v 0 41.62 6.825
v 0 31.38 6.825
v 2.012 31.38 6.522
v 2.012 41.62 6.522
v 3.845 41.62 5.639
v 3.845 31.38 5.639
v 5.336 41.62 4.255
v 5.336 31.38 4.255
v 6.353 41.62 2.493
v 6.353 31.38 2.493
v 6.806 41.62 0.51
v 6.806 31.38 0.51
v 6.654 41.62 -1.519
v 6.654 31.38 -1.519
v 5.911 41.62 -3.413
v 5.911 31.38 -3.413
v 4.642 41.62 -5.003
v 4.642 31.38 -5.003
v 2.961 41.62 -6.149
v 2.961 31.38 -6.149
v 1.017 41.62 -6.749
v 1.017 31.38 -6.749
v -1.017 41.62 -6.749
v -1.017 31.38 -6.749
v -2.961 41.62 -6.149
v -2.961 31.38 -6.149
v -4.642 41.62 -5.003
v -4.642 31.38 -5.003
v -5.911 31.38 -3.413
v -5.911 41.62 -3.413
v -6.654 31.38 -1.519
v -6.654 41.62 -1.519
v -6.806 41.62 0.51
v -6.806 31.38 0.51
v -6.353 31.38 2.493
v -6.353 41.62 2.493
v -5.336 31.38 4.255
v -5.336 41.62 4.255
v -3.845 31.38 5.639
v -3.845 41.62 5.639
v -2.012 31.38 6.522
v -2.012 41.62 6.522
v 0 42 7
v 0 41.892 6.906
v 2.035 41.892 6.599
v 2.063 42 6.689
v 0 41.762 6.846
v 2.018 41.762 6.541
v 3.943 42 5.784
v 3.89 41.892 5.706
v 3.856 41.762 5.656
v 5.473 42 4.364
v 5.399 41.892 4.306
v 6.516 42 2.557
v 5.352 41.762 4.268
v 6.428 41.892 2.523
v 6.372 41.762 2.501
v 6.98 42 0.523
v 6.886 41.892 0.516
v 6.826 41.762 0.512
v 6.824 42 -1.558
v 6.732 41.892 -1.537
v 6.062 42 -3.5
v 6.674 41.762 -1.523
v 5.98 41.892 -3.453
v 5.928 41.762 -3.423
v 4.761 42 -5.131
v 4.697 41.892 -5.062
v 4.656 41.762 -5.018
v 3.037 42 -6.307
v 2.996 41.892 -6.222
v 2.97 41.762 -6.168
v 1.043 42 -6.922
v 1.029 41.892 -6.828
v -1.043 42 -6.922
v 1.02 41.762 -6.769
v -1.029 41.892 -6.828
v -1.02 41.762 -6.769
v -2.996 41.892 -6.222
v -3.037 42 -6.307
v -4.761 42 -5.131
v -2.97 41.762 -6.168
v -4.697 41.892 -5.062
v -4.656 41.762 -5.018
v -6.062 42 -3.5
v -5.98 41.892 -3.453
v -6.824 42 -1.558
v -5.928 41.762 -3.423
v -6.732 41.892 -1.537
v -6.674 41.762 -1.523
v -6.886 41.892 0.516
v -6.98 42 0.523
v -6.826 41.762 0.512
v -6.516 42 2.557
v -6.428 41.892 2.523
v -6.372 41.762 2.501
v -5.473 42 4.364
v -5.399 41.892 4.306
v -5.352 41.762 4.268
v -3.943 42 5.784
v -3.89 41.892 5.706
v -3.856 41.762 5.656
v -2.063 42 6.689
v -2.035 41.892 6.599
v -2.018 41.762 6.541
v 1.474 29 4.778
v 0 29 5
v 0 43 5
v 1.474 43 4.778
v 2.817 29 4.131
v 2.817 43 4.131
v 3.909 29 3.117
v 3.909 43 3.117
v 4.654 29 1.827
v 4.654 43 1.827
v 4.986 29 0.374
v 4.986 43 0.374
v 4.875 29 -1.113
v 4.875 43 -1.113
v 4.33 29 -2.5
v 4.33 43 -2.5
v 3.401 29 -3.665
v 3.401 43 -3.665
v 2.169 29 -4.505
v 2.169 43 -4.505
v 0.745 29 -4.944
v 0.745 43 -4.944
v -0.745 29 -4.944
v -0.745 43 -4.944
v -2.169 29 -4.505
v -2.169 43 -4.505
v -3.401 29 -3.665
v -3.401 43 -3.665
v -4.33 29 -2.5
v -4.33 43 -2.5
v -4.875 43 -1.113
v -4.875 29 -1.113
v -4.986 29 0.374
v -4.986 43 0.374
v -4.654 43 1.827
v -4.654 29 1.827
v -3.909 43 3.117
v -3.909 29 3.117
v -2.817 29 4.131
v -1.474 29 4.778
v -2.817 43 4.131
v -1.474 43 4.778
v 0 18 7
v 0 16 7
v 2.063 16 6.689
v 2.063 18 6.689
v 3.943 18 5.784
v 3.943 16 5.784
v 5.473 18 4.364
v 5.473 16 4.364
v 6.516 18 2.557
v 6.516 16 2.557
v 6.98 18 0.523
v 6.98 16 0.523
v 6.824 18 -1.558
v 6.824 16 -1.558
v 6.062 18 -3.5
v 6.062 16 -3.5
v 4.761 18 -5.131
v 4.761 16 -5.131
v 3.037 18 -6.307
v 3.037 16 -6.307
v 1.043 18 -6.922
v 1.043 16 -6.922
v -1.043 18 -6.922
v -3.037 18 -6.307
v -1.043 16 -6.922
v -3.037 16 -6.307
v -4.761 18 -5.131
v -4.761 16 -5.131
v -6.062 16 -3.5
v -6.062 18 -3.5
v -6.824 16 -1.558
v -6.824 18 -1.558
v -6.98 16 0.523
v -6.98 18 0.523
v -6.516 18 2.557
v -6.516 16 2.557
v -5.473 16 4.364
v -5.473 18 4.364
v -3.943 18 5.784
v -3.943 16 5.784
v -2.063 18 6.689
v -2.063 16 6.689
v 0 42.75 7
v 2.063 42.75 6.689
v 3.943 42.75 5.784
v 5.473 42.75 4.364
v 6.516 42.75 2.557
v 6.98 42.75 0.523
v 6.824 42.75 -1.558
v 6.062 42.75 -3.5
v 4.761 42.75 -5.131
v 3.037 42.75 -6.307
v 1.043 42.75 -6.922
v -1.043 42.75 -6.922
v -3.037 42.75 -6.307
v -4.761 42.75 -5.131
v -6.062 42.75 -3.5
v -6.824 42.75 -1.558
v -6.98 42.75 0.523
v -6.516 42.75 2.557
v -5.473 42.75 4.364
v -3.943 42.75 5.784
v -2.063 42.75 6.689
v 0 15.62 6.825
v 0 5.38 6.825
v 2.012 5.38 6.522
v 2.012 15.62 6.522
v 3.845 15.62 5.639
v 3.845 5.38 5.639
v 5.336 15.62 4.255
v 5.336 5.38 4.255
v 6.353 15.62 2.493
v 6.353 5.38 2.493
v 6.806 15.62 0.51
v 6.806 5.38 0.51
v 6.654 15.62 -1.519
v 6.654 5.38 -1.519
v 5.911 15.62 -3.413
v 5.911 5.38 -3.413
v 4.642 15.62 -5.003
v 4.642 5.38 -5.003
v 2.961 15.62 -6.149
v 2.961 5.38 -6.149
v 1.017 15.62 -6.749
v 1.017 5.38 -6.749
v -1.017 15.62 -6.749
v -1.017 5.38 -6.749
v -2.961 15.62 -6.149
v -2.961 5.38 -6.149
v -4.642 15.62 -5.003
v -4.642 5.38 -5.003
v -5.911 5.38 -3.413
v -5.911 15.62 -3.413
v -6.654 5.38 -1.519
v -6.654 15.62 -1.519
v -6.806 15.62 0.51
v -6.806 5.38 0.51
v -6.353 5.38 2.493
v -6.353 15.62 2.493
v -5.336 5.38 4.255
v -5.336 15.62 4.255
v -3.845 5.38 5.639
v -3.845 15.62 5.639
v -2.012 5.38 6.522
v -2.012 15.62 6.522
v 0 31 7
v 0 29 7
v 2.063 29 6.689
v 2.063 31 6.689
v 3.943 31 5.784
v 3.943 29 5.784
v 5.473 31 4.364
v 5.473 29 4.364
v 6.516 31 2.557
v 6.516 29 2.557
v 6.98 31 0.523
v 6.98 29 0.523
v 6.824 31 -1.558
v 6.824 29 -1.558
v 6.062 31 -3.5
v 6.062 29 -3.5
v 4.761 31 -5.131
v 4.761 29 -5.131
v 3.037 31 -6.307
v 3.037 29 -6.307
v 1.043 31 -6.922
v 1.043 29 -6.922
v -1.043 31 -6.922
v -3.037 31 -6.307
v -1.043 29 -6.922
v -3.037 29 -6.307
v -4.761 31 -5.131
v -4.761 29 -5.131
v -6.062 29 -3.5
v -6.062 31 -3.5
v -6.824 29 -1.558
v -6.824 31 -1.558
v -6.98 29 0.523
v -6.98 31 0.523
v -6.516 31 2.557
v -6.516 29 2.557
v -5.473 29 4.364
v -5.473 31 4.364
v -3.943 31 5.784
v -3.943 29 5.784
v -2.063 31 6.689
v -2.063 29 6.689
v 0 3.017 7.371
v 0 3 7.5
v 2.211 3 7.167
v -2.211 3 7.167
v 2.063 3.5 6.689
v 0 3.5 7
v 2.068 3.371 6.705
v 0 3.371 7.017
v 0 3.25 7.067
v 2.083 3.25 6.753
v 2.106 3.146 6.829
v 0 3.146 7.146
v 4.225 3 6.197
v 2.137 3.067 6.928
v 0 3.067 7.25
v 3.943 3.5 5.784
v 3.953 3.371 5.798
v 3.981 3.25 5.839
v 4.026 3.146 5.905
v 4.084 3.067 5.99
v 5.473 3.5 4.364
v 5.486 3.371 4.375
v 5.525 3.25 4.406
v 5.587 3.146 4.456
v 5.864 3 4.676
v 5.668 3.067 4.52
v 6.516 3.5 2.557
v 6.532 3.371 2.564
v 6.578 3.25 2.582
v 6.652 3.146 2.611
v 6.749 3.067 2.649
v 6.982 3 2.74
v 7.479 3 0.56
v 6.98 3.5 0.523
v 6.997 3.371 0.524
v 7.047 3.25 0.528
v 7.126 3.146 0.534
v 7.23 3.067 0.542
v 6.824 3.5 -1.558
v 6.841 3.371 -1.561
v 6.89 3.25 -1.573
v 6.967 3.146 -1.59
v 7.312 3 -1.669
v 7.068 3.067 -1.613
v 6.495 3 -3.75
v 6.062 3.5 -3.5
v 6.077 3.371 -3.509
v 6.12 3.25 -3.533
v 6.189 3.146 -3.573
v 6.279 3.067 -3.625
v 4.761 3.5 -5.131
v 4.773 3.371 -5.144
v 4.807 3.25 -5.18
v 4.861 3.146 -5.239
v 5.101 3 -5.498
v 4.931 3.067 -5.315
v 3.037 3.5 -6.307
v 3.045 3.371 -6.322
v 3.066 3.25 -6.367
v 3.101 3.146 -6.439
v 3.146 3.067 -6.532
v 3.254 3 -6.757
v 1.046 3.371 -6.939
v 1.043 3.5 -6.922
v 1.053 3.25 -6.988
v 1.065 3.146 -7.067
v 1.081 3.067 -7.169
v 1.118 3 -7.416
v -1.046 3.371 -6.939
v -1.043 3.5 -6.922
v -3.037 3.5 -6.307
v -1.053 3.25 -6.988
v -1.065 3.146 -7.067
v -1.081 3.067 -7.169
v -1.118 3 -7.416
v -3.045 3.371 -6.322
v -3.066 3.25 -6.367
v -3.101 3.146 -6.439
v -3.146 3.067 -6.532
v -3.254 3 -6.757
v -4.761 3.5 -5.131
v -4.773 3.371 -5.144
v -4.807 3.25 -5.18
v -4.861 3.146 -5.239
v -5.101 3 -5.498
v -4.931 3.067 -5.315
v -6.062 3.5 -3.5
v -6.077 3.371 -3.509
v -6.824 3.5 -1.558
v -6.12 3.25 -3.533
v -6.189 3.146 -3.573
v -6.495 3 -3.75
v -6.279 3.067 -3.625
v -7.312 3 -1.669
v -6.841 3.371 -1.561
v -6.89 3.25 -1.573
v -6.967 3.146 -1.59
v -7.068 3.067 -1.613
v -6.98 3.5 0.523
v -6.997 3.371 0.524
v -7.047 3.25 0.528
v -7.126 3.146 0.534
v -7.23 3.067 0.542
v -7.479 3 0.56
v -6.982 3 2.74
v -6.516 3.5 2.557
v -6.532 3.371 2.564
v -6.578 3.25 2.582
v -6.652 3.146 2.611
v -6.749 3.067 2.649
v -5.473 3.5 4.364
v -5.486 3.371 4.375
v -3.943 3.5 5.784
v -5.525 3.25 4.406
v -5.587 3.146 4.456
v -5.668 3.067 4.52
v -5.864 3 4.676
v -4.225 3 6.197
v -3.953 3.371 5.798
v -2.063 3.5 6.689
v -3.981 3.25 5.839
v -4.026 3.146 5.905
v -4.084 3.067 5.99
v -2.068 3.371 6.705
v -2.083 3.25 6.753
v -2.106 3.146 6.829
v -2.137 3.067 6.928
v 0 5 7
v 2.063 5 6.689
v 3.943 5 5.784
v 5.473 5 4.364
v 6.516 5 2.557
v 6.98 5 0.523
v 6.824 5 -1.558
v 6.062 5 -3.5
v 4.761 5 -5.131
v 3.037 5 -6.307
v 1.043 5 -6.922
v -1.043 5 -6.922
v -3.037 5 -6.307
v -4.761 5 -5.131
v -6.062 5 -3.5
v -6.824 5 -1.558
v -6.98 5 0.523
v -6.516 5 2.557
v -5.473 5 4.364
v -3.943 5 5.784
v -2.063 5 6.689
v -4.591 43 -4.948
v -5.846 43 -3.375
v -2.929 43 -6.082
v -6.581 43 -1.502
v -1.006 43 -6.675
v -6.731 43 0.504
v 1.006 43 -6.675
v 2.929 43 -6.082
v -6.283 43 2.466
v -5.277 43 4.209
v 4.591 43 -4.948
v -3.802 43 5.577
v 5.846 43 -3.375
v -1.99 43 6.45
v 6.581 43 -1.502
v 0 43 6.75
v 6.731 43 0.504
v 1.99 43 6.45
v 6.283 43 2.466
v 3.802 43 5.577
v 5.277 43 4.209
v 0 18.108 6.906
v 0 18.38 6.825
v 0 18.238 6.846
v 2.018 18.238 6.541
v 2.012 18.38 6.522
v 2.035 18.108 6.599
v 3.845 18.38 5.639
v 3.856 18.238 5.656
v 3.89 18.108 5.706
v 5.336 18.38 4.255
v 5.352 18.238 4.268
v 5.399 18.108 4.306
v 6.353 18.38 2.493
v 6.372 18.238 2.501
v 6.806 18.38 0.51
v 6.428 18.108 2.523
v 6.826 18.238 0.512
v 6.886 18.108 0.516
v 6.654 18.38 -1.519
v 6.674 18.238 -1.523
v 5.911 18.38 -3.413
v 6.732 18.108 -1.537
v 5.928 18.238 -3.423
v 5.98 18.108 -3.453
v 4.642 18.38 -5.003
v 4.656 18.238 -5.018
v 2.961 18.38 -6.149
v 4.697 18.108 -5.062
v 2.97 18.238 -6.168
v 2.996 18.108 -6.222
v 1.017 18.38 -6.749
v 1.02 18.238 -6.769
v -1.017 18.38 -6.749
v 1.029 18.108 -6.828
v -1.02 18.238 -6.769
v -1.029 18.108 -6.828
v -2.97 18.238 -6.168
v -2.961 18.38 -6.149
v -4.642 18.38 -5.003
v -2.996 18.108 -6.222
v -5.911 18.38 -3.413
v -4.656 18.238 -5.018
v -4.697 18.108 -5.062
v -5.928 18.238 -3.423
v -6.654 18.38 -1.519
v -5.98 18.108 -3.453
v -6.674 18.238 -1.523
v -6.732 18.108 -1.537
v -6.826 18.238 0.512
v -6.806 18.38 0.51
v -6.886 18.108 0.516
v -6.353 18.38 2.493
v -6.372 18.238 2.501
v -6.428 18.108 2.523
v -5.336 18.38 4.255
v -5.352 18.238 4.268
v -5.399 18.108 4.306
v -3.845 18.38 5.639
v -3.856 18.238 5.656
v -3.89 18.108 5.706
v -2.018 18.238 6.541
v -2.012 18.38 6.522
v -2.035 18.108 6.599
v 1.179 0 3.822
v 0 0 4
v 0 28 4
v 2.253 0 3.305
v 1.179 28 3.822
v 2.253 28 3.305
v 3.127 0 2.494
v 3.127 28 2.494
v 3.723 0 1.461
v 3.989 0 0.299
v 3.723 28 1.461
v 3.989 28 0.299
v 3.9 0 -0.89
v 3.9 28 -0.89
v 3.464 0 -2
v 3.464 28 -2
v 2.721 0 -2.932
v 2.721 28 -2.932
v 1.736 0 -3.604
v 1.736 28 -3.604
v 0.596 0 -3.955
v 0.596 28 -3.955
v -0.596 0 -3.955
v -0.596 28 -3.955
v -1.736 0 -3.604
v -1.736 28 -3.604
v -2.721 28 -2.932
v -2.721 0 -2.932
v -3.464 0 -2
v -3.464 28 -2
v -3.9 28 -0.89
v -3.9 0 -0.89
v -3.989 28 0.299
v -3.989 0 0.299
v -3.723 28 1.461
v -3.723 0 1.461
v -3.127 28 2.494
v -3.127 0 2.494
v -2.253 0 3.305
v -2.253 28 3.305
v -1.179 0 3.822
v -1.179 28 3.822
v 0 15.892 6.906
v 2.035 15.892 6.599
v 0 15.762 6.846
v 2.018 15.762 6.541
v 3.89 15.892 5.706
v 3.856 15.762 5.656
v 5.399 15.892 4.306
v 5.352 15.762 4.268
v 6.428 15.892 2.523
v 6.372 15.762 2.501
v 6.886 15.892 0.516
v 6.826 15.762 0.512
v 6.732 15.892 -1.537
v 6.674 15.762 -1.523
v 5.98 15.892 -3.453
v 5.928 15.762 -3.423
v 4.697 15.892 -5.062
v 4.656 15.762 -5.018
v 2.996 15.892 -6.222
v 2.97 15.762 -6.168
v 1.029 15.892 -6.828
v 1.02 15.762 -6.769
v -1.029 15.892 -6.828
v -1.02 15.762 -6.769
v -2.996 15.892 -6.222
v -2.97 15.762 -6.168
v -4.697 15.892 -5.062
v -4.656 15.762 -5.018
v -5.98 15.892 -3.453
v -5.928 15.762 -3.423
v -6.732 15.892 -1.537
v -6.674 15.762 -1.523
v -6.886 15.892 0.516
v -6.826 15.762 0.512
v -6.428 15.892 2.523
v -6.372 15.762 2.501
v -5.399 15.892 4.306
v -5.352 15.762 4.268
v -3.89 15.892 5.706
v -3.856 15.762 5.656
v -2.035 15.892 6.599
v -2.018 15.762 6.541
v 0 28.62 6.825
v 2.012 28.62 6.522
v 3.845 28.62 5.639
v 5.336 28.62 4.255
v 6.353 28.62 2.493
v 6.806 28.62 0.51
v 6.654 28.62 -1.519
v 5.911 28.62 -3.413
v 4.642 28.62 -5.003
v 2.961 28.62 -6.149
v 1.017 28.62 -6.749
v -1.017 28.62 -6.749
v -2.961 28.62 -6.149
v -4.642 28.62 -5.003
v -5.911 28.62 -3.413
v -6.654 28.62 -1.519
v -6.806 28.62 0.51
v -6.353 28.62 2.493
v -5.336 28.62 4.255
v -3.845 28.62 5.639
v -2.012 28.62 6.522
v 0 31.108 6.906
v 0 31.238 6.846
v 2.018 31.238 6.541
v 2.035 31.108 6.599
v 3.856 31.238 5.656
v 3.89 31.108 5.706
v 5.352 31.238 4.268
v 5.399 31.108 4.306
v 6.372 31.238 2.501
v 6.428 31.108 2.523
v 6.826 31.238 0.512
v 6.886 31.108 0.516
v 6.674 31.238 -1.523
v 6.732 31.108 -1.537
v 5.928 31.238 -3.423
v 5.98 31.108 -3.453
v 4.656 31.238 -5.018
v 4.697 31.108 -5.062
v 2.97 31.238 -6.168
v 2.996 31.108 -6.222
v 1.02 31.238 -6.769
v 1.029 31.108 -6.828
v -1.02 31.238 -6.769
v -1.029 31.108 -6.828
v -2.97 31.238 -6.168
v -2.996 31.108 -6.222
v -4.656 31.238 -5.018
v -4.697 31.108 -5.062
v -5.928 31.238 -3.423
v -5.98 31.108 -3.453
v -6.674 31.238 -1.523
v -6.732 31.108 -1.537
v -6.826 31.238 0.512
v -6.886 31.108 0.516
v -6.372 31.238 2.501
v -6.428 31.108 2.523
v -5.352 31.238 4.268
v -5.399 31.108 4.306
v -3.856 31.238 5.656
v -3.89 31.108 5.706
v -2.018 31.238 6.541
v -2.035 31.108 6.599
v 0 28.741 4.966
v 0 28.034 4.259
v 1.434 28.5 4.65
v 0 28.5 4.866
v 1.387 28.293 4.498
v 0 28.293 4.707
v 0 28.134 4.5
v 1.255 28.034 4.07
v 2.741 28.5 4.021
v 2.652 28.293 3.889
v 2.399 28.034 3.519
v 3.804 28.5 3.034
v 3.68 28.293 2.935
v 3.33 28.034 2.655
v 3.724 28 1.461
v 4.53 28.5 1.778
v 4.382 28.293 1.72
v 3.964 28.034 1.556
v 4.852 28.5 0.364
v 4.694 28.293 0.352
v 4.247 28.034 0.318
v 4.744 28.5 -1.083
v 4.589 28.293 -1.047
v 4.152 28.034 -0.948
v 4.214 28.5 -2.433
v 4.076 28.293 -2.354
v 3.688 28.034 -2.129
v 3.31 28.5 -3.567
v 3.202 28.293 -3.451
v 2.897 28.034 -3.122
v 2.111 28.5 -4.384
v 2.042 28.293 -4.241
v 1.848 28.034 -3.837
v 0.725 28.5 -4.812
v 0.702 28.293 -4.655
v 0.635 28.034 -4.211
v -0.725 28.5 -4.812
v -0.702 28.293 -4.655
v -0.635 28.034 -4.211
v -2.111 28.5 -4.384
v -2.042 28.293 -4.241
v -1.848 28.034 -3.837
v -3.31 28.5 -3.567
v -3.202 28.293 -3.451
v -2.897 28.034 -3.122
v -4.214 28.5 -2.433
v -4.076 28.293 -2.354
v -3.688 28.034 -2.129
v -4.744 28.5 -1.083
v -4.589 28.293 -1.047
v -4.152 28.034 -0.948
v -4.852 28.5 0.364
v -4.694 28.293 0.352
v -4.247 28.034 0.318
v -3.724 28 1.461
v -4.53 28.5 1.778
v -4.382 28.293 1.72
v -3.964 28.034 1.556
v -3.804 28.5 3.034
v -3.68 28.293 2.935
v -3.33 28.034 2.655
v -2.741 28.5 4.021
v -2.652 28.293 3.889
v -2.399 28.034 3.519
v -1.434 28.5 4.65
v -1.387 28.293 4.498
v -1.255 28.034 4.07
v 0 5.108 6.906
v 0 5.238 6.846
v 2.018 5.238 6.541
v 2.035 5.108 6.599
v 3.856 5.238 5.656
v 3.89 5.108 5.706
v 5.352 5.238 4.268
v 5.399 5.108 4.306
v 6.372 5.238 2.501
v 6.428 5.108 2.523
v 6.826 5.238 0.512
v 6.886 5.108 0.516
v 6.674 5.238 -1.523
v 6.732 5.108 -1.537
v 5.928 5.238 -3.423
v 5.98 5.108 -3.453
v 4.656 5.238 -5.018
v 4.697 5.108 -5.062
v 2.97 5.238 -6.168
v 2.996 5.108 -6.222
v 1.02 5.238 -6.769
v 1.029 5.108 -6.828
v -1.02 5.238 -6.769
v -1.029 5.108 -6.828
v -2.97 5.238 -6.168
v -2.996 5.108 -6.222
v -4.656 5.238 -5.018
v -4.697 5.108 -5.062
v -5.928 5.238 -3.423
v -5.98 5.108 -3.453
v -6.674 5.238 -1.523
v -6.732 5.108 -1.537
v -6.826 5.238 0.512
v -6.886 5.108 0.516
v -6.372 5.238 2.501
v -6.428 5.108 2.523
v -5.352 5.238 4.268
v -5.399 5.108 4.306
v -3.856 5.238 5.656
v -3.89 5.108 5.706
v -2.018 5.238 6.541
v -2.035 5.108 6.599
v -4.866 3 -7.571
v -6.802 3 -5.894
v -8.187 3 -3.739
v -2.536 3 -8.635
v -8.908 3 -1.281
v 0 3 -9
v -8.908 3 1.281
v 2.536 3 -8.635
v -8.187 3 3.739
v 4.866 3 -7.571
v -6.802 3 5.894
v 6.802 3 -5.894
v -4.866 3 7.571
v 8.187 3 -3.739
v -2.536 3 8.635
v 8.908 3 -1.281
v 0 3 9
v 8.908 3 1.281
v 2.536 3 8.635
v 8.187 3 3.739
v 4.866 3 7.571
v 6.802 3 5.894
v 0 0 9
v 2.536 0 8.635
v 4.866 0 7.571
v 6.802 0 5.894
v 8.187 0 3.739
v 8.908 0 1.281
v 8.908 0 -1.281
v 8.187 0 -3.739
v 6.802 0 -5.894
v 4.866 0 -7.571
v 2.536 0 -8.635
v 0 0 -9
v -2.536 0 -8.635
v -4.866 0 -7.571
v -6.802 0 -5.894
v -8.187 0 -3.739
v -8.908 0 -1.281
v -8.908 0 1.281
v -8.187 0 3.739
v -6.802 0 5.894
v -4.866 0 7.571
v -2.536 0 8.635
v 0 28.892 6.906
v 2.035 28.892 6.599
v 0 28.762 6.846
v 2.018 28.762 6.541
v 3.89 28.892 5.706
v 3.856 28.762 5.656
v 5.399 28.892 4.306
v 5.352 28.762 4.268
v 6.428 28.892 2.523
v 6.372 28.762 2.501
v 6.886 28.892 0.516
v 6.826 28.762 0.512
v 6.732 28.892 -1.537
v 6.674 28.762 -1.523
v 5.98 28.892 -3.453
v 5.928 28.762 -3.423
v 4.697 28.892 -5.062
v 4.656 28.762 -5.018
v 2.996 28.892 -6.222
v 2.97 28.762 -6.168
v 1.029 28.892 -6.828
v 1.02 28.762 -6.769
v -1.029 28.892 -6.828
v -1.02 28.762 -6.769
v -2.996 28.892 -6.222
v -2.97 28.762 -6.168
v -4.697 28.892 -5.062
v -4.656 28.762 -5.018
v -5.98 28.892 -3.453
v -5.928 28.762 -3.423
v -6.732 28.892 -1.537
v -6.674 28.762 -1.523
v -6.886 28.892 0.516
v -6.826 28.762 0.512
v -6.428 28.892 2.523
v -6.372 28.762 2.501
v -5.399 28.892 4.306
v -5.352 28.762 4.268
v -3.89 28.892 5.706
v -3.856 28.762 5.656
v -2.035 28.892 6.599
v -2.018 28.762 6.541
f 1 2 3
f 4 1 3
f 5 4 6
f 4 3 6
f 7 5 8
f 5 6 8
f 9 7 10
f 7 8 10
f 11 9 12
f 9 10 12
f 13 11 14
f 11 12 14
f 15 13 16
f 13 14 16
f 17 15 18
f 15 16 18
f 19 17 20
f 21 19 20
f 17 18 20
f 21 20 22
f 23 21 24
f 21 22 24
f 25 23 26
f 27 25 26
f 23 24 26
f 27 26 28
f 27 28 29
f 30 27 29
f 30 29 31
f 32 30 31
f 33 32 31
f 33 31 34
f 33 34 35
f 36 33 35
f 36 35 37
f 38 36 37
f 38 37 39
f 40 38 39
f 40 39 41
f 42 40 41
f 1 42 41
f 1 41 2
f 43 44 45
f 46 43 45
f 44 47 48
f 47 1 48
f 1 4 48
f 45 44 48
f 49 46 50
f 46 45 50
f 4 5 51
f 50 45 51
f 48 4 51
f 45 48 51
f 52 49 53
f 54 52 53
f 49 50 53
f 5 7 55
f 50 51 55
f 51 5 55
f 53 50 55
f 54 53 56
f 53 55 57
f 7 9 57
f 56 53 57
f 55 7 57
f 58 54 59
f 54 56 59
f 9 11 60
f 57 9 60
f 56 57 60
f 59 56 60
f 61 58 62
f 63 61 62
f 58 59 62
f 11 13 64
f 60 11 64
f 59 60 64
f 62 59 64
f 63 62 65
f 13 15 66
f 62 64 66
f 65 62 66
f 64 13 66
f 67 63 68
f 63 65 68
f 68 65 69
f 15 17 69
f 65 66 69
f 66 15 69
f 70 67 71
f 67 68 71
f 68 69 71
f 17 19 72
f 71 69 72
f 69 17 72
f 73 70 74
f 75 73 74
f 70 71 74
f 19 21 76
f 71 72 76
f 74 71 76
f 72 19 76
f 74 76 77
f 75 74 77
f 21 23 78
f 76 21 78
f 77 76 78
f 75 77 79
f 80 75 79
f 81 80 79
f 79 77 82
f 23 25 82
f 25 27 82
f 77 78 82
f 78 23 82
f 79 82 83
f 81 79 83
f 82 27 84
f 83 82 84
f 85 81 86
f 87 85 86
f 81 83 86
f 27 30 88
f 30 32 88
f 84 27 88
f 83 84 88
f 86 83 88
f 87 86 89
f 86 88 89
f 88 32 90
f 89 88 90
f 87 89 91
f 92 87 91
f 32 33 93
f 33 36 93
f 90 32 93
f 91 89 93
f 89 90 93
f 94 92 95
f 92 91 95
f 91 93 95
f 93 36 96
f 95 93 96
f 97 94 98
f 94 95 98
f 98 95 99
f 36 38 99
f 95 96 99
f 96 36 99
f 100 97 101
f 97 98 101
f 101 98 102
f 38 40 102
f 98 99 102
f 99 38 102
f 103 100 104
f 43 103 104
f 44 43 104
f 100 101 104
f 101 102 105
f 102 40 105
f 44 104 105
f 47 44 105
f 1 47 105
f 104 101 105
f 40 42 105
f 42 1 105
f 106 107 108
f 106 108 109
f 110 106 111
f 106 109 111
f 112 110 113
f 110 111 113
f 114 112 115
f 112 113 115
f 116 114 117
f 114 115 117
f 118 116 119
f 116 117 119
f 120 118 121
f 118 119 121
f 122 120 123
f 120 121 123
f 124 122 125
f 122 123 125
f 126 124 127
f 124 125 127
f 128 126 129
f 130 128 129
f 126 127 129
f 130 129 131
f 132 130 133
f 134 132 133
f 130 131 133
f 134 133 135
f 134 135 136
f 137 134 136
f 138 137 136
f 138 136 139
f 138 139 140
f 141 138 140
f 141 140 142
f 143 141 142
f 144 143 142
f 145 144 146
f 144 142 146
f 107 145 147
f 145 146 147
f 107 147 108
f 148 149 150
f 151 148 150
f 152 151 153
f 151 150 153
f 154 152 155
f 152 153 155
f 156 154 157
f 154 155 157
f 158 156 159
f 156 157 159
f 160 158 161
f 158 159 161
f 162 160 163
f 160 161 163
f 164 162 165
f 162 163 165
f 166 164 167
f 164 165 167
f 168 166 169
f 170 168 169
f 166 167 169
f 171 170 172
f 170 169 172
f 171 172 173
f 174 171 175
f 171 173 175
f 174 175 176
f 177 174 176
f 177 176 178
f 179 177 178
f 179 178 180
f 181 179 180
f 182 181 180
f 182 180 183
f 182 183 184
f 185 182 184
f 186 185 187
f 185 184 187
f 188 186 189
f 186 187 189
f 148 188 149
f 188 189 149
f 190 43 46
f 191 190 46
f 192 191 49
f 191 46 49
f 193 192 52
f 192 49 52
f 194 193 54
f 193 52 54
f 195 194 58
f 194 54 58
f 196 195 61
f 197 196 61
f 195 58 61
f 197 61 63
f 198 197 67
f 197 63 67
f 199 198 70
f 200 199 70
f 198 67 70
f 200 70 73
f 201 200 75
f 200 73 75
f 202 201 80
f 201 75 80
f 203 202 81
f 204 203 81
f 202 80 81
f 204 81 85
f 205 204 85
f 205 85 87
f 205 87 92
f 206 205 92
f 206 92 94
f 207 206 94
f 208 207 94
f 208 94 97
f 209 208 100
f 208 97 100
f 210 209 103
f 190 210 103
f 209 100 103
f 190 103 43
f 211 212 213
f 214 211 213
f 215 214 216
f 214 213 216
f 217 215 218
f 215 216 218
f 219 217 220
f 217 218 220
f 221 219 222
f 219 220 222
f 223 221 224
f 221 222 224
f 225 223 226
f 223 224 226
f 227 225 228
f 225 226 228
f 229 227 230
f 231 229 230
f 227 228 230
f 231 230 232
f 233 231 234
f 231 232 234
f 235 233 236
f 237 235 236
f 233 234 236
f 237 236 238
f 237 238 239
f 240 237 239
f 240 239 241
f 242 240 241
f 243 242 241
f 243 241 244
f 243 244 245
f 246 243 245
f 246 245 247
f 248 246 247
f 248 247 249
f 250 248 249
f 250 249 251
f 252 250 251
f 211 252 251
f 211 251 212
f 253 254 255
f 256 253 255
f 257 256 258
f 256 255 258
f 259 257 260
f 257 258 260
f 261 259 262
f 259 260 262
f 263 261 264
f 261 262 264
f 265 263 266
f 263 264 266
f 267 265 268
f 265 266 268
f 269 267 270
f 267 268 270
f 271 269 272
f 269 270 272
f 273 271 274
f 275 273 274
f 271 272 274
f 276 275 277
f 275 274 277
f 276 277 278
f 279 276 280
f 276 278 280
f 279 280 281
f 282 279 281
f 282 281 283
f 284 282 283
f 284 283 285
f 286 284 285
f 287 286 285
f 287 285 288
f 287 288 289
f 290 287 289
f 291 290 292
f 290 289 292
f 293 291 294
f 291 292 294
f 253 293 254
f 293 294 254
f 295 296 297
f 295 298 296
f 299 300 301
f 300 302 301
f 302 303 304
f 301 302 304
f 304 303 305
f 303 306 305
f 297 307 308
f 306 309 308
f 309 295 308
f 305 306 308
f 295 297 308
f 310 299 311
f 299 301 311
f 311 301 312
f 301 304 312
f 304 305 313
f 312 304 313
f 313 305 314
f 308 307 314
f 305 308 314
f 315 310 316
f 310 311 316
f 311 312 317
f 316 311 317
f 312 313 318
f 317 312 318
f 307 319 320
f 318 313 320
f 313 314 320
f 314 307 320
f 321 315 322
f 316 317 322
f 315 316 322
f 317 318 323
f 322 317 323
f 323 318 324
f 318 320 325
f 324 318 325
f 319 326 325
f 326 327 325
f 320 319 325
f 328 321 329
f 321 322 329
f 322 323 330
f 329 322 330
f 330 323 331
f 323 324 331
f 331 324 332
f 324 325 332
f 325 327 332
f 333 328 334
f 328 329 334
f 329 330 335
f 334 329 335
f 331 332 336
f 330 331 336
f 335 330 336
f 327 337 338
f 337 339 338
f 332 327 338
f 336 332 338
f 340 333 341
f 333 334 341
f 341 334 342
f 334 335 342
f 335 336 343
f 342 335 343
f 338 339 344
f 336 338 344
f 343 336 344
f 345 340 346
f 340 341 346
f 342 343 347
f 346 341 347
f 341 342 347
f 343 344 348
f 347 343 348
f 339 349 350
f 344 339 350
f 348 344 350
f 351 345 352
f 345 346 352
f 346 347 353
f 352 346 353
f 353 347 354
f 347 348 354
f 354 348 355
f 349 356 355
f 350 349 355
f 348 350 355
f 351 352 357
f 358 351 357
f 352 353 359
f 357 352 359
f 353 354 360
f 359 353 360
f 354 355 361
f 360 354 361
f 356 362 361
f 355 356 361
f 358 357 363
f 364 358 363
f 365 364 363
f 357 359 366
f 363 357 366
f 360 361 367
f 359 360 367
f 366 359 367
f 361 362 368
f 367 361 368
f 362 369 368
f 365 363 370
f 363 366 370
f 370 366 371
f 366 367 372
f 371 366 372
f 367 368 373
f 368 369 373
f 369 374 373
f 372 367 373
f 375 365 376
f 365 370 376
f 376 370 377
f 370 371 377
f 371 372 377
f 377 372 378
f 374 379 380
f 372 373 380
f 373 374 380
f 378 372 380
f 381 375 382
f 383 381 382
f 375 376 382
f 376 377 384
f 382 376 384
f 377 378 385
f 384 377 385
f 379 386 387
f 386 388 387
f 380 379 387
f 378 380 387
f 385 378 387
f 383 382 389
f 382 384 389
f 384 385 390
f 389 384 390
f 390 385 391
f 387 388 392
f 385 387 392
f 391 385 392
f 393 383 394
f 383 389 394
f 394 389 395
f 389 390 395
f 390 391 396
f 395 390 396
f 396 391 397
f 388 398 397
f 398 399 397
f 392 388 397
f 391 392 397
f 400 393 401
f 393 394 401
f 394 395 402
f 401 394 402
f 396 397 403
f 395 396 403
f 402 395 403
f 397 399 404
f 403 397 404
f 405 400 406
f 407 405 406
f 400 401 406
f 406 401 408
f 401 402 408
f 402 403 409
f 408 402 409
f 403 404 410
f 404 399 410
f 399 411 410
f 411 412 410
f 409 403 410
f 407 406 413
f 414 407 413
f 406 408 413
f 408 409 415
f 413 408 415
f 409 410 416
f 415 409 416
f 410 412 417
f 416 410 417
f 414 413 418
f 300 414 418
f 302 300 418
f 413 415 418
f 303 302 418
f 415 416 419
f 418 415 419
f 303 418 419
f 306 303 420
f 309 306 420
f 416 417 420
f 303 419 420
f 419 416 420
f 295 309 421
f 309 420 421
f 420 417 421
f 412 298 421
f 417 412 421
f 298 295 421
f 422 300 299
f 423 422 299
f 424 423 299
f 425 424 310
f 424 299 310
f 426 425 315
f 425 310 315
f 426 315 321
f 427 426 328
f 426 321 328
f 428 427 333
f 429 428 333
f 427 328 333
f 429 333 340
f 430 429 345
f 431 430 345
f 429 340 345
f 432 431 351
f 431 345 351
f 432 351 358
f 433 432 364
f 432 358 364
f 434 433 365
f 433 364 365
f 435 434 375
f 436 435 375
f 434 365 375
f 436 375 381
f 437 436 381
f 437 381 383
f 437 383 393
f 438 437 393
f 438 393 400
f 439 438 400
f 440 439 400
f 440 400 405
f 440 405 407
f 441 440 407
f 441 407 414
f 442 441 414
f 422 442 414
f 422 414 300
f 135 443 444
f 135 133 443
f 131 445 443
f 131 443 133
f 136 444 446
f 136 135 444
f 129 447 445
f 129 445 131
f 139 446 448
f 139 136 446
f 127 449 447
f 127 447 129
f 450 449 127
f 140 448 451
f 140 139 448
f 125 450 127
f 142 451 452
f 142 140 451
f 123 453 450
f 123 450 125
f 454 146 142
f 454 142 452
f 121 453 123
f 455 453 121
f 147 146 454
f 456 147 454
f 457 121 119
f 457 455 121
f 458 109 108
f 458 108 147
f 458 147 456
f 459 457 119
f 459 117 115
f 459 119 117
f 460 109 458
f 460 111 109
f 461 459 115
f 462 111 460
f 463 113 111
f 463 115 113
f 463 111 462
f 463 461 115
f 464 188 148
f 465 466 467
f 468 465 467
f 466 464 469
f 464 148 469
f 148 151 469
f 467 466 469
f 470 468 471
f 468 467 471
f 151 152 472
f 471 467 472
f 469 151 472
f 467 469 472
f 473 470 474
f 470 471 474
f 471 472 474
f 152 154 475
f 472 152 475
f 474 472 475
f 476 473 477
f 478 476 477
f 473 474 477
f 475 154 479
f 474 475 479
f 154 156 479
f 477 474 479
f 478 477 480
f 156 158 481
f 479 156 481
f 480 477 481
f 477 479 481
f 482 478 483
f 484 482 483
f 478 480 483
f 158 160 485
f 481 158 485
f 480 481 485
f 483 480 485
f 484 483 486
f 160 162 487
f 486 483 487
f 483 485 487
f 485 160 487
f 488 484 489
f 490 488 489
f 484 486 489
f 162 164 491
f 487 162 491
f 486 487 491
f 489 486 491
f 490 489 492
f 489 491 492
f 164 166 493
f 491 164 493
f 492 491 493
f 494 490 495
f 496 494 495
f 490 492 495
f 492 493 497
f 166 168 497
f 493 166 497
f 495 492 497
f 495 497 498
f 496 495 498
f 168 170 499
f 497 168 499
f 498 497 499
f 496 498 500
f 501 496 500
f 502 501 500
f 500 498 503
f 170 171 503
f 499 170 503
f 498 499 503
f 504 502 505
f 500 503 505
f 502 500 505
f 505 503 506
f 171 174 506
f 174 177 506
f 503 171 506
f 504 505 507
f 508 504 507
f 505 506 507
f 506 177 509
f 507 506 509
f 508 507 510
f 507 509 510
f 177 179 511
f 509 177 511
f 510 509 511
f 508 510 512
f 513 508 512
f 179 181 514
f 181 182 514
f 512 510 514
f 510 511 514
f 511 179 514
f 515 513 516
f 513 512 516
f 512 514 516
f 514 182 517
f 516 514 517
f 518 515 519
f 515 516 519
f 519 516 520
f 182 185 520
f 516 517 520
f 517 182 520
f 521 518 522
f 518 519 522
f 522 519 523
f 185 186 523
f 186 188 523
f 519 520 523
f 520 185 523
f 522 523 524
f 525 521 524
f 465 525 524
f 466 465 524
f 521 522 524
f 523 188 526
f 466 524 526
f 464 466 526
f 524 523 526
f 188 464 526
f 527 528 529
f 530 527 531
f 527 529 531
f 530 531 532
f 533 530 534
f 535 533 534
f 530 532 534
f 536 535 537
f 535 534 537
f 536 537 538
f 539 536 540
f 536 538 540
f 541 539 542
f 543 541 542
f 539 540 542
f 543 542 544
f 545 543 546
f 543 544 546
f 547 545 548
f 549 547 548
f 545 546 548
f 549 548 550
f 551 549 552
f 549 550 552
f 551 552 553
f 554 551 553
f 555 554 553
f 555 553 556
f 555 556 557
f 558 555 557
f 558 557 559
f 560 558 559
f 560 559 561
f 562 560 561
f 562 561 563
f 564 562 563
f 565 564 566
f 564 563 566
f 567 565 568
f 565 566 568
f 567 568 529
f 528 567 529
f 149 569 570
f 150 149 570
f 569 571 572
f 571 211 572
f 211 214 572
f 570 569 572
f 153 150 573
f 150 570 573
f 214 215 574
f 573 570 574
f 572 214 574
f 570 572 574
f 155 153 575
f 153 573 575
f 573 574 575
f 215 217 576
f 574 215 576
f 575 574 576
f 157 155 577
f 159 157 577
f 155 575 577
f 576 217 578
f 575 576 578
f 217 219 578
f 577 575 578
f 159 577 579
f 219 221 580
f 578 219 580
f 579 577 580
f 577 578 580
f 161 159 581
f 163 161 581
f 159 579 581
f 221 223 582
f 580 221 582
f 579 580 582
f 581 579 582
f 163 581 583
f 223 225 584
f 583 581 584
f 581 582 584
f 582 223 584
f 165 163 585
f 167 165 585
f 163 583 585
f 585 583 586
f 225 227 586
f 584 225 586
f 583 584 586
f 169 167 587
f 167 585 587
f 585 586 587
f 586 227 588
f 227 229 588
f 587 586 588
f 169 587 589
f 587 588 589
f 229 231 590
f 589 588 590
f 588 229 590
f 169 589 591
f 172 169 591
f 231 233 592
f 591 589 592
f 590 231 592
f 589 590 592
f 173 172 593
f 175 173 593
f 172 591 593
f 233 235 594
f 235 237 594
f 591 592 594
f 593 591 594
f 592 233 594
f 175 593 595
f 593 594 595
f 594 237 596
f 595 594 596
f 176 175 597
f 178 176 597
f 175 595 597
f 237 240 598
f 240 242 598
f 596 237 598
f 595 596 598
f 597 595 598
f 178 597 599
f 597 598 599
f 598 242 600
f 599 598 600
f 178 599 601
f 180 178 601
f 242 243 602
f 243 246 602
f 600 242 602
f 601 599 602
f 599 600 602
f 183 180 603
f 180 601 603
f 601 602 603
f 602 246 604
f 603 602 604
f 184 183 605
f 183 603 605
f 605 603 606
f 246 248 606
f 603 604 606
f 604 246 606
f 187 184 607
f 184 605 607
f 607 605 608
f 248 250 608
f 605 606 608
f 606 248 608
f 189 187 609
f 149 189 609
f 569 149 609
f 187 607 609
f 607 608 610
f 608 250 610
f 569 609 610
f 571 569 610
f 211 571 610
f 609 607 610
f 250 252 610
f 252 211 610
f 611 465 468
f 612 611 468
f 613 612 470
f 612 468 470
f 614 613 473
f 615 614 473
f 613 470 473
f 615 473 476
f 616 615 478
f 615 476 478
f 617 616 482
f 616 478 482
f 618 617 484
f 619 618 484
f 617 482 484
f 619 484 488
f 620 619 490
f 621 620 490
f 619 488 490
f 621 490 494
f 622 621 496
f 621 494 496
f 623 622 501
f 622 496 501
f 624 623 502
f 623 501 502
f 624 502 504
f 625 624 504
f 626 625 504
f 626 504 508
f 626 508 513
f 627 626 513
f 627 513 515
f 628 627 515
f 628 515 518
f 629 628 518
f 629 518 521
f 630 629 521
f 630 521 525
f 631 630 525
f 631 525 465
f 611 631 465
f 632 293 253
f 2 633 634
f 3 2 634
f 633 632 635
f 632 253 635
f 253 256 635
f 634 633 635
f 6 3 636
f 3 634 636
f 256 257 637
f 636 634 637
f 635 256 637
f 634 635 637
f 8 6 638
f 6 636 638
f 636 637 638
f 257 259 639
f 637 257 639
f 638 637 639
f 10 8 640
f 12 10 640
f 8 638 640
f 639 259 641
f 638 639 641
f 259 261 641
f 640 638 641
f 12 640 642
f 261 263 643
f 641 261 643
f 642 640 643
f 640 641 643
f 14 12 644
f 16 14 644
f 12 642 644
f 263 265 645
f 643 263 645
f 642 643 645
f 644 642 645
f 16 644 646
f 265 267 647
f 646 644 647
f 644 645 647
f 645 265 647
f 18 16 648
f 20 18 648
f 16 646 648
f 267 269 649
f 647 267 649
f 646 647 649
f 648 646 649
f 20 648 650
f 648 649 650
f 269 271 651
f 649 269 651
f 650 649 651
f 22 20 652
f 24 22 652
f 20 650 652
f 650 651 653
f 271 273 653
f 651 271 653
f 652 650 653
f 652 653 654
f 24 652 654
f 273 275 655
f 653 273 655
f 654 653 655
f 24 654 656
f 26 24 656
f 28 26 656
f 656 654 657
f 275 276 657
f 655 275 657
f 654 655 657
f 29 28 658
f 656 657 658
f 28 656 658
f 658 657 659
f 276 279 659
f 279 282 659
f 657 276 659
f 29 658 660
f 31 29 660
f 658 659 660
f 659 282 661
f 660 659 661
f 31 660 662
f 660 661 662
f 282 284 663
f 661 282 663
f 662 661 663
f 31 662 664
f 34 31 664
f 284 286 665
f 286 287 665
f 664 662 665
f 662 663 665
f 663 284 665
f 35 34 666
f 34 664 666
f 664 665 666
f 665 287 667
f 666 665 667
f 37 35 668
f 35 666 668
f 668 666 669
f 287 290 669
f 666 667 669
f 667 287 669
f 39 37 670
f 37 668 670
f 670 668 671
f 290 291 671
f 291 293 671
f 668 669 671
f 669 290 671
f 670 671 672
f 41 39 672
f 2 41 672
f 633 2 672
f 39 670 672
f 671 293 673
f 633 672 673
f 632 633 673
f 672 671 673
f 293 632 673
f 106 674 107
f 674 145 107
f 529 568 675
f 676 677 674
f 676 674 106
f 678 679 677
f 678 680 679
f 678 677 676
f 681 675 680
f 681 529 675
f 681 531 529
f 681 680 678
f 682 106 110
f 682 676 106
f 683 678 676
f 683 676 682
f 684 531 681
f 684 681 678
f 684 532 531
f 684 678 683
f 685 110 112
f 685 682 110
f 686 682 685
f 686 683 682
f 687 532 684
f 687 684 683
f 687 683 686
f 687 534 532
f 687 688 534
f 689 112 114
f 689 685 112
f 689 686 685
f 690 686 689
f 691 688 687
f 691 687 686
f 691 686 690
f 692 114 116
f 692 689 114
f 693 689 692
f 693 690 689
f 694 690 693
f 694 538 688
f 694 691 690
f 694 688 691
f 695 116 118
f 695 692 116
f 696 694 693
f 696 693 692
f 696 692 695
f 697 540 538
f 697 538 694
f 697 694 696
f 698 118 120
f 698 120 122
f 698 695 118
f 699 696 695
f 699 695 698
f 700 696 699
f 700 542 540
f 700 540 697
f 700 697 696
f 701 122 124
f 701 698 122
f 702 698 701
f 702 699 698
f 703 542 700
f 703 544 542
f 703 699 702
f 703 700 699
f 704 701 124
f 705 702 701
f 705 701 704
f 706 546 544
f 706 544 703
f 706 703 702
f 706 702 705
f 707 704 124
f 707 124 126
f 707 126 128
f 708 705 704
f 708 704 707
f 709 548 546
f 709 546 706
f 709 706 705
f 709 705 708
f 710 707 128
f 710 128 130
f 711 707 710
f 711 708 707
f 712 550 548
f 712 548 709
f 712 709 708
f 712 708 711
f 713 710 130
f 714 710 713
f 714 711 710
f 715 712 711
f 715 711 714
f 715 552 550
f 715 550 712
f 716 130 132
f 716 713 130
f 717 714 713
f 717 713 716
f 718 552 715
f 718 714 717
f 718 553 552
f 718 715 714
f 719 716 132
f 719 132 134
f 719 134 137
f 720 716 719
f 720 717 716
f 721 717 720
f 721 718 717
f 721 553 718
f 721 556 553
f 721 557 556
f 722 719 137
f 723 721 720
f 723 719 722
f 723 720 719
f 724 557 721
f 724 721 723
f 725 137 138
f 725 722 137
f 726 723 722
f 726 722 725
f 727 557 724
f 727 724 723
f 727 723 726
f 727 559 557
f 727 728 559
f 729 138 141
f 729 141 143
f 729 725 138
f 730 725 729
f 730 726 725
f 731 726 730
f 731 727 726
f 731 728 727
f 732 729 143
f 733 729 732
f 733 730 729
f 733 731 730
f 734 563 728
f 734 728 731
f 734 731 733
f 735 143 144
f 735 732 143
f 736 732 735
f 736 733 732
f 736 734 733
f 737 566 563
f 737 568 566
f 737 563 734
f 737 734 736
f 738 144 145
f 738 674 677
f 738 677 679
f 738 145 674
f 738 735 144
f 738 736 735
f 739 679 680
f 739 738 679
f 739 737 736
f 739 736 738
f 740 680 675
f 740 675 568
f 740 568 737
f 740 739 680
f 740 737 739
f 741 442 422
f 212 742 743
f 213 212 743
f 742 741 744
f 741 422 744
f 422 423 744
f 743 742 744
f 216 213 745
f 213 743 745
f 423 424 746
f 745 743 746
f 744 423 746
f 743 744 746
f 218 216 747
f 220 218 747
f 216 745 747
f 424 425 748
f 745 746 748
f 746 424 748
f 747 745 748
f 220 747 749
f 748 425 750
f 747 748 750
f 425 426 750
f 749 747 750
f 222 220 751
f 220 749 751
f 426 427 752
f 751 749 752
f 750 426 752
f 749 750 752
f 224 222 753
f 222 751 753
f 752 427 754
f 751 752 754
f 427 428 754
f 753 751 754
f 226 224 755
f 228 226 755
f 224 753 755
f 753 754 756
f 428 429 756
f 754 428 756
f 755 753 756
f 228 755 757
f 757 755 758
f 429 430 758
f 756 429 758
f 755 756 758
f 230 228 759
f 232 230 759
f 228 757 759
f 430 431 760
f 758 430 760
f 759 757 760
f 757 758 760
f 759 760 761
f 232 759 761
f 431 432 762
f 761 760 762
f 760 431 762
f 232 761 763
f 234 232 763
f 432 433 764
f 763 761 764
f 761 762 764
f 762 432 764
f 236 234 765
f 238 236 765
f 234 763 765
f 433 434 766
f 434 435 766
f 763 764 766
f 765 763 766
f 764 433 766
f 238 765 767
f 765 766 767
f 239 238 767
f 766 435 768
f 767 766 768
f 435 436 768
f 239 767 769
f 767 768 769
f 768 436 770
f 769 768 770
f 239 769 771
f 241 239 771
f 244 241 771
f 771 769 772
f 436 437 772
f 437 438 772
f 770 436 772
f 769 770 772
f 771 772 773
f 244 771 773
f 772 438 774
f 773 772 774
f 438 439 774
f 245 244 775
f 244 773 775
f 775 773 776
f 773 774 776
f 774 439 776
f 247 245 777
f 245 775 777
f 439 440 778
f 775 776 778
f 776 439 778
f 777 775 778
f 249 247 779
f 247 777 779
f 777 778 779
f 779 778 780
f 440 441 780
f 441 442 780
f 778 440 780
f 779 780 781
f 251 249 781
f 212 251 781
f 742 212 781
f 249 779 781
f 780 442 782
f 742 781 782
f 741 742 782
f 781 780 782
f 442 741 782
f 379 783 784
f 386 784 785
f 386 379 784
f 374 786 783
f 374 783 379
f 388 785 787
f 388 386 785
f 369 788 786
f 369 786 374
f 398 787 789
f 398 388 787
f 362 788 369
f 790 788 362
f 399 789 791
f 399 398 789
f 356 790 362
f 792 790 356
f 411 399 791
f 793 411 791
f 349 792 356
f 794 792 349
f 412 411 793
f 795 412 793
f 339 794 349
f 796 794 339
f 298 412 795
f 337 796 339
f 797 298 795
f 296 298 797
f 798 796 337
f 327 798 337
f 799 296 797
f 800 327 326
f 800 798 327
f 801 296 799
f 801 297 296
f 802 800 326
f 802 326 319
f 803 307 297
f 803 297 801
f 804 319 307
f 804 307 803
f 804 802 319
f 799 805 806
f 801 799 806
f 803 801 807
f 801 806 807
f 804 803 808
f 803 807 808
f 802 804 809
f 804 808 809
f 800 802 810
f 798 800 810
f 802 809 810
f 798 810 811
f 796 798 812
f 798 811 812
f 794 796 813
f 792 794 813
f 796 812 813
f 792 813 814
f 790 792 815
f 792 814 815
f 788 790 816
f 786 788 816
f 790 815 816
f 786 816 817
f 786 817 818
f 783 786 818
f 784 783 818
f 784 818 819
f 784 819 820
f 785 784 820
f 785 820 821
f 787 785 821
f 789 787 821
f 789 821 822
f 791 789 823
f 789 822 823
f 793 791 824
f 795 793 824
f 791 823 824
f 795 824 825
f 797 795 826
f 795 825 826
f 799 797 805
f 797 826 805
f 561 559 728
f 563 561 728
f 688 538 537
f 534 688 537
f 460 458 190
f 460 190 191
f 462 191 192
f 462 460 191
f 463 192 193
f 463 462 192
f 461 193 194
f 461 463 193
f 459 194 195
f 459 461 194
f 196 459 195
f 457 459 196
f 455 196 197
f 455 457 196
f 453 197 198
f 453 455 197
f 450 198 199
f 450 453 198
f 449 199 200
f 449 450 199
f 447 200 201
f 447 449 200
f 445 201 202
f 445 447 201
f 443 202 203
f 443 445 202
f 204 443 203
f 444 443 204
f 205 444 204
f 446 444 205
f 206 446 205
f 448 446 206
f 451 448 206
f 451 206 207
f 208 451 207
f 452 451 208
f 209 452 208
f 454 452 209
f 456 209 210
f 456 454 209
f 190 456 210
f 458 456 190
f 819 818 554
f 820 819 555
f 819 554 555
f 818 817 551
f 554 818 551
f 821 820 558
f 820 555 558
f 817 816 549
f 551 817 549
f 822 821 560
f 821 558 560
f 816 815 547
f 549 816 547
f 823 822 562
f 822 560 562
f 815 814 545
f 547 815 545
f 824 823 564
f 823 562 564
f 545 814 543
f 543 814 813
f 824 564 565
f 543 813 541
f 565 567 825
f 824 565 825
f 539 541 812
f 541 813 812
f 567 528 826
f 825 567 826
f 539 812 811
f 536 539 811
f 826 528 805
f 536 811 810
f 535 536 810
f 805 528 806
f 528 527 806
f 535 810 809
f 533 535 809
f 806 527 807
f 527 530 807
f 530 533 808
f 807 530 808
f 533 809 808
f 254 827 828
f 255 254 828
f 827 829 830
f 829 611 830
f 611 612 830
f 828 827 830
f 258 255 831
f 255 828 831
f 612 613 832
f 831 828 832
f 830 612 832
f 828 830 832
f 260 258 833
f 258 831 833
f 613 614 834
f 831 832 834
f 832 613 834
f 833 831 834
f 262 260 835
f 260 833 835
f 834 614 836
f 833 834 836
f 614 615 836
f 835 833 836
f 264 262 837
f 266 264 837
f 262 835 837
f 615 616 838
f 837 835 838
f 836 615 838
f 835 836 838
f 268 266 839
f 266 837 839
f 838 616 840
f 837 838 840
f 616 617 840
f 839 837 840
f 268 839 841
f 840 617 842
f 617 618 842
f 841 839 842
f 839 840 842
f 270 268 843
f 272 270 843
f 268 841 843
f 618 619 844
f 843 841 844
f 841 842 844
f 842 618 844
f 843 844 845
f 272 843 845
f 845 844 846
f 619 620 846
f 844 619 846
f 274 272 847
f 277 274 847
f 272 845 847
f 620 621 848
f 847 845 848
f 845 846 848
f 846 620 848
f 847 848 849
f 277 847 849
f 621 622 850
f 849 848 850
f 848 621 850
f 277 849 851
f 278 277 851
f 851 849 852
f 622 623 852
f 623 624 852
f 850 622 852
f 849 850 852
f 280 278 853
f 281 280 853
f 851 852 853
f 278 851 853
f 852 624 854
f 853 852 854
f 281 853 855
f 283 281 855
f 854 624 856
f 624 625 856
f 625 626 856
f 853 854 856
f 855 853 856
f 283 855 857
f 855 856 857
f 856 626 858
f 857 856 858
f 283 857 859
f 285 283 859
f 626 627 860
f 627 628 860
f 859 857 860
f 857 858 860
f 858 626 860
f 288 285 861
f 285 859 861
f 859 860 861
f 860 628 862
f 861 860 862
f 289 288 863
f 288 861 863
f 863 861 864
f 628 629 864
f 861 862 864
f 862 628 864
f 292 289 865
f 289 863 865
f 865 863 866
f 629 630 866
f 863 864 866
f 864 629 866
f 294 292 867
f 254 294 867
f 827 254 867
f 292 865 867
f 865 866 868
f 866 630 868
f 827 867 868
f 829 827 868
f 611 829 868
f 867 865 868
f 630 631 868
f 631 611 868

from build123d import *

# Parameters (mm, degrees)
SKETCH1_R           = 9
BOSS_EXTRUDE1_DEPTH = 3
SKETCH2_R           = 7
BOSS_EXTRUDE2_DEPTH = 2
SKETCH3_R           = 6.825
BOSS_EXTRUDE3_DEPTH = 11
SKETCH4_R           = 7
BOSS_EXTRUDE4_DEPTH = 2
SKETCH5_R           = 6.825
BOSS_EXTRUDE5_DEPTH = 11
SKETCH6_R           = 7
BOSS_EXTRUDE6_DEPTH = 2
SKETCH7_R           = 6.825
BOSS_EXTRUDE7_DEPTH = 11
SKETCH8_R           = 7
BOSS_EXTRUDE8_DEPTH = 1
FILLET3_R           = 0.5
CHAMFER2_SIZE       = 0.25
SKETCH13_R          = 5
CUT_EXTRUDE1_DEPTH  = 15
SKETCH14_R          = 4
CUT_EXTRUDE2_DEPTH  = 28
FILLET4_R           = 1


# Some blends are built 0.0001 mm under size
with BuildPart() as part:
    # Sketch1 → Boss-Extrude1 (new body)
    with BuildSketch(Plane(origin=(0, 0, 0), x_dir=(1, 0, 0), z_dir=(0, 1, 0))):
        with Locations(Location((0, 0, 0), (0, 0, 270))):
            Circle(SKETCH1_R)
    extrude(amount=BOSS_EXTRUDE1_DEPTH)

    # Sketch2 → Boss-Extrude2 (add)
    with BuildSketch(Plane(origin=(0, 3, 0), x_dir=(1, 0, 0), z_dir=(0, 1, 0))):
        with Locations(Location((0, 0, 0), (0, 0, 270))):
            Circle(SKETCH2_R)
    extrude(amount=BOSS_EXTRUDE2_DEPTH)

    # Sketch3 → Boss-Extrude3 (add)
    with BuildSketch(Plane(origin=(0, 5, 0), x_dir=(1, 0, 0), z_dir=(0, 1, 0))):
        with Locations(Location((0, 0, 0), (0, 0, 270))):
            Circle(SKETCH3_R)
    extrude(amount=BOSS_EXTRUDE3_DEPTH)

    # Sketch4 → Boss-Extrude4 (add)
    with BuildSketch(Plane(origin=(0, 16, 0), x_dir=(1, 0, 0), z_dir=(0, 1, 0))):
        with Locations(Location((0, 0, 0), (0, 0, 270))):
            Circle(SKETCH4_R)
    extrude(amount=BOSS_EXTRUDE4_DEPTH)

    # Sketch5 → Boss-Extrude5 (add)
    with BuildSketch(Plane(origin=(0, 18, 0), x_dir=(1, 0, 0), z_dir=(0, 1, 0))):
        with Locations(Location((0, 0, 0), (0, 0, 270))):
            Circle(SKETCH5_R)
    extrude(amount=BOSS_EXTRUDE5_DEPTH)

    # Sketch6 → Boss-Extrude6 (add)
    with BuildSketch(Plane(origin=(0, 29, 0), x_dir=(1, 0, 0), z_dir=(0, 1, 0))):
        with Locations(Location((0, 0, 0), (0, 0, 270))):
            Circle(SKETCH6_R)
    extrude(amount=BOSS_EXTRUDE6_DEPTH)

    # Sketch7 → Boss-Extrude7 (add)
    with BuildSketch(Plane(origin=(0, 31, 0), x_dir=(1, 0, 0), z_dir=(0, 1, 0))):
        with Locations(Location((0, 0, 0), (0, 0, 270))):
            Circle(SKETCH7_R)
    extrude(amount=BOSS_EXTRUDE7_DEPTH)

    # Sketch8 → Boss-Extrude8 (add)
    with BuildSketch(Plane(origin=(0, 42, 0), x_dir=(1, 0, 0), z_dir=(0, 1, 0))):
        with Locations(Location((0, 0, 0), (0, 0, 270))):
            Circle(SKETCH8_R)
    extrude(amount=BOSS_EXTRUDE8_DEPTH)

    # Fillet3
    # the kernel refuses this fillet: 0.5 mm, written as the material it adds along each edge
    with BuildSketch(Plane(origin=(0, 16, 0), x_dir=(0, 0, 1), z_dir=(-1, 0, 0))) as fillet3_piece_1:
        with BuildLine():
            CenterArc((7.325, -0.379967104), FILLET3_R, 130.541601874, 49.458398126)
            Line((6.825, -0.379967104), (6.815, -0.379967104))
            Line((6.815, -0.379967104), (6.815, 0))
            Line((6.815, 0), (6.825, 0.01))
            ThreePointArc((6.825, 0.01), (6.9125, 0.01), (6.9935, 0.007599342))
            Line((6.9935, 0.007599342), (7, 0))
        make_face()
    revolve(axis=Axis((0, 16, 0), (0, 1, 0)))
    with BuildSketch(Plane(origin=(0, 18, 0), x_dir=(0, 0, 1), z_dir=(-1, 0, 0))) as fillet3_piece_2:
        with BuildLine():
            CenterArc((7.325, 0.379967104), FILLET3_R, 180, 49.458398126)
            Line((7, 0), (6.9935, -0.007599342))
            ThreePointArc((6.9935, -0.007599342), (6.9125, -0.01), (6.825, -0.01))
            Line((6.825, -0.01), (6.815, 0))
            Line((6.815, 0), (6.815, 0.379967104))
            Line((6.815, 0.379967104), (6.825, 0.379967104))
        make_face()
    revolve(axis=Axis((0, 18, 0), (0, 1, 0)))
    with BuildSketch(Plane(origin=(0, 29, 0), x_dir=(0, 0, 1), z_dir=(-1, 0, 0))) as fillet3_piece_3:
        with BuildLine():
            CenterArc((7.325, -0.379967104), FILLET3_R, 130.541601874, 49.458398126)
            Line((6.825, -0.379967104), (6.815, -0.379967104))
            Line((6.815, -0.379967104), (6.815, 0))
            Line((6.815, 0), (6.825, 0.01))
            ThreePointArc((6.825, 0.01), (6.9125, 0.01), (6.9935, 0.007599342))
            Line((6.9935, 0.007599342), (7, 0))
        make_face()
    revolve(axis=Axis((0, 29, 0), (0, 1, 0)))
    with BuildSketch(Plane(origin=(0, 31, 0), x_dir=(0, 0, 1), z_dir=(-1, 0, 0))) as fillet3_piece_4:
        with BuildLine():
            CenterArc((7.325, 0.379967104), FILLET3_R, 180, 49.458398126)
            Line((7, 0), (6.9935, -0.007599342))
            ThreePointArc((6.9935, -0.007599342), (6.9125, -0.01), (6.825, -0.01))
            Line((6.825, -0.01), (6.815, 0))
            Line((6.815, 0), (6.815, 0.379967104))
            Line((6.815, 0.379967104), (6.825, 0.379967104))
        make_face()
    revolve(axis=Axis((0, 31, 0), (0, 1, 0)))
    with BuildSketch(Plane(origin=(0, 42, 0), x_dir=(0, 0, 1), z_dir=(-1, 0, 0))) as fillet3_piece_5:
        with BuildLine():
            CenterArc((7.325, -0.379967104), FILLET3_R, 130.541601874, 49.458398126)
            Line((6.825, -0.379967104), (6.815, -0.379967104))
            Line((6.815, -0.379967104), (6.815, 0))
            Line((6.815, 0), (6.825, 0.01))
            ThreePointArc((6.825, 0.01), (6.9125, 0.01), (6.9935, 0.007599342))
            Line((6.9935, 0.007599342), (7, 0))
        make_face()
    revolve(axis=Axis((0, 42, 0), (0, 1, 0)))
    with BuildSketch(Plane(origin=(0, 3, 0), x_dir=(0, 0, 1), z_dir=(-1, 0, 0))) as fillet3_piece_6:
        with BuildLine():
            CenterArc((7 + FILLET3_R, FILLET3_R), FILLET3_R, 180, 90)
            Line((7 + FILLET3_R, 0), (7 + FILLET3_R, -FILLET3_R * 0.02))
            Line((7 + FILLET3_R, -FILLET3_R * 0.02), (7 - FILLET3_R * 0.02, -FILLET3_R * 0.02))
            Line((7 - FILLET3_R * 0.02, -FILLET3_R * 0.02), (7 - FILLET3_R * 0.02, FILLET3_R))
            Line((7 - FILLET3_R * 0.02, FILLET3_R), (7, FILLET3_R))
        make_face()
    revolve(axis=Axis((0, 3, 0), (0, 1, 0)))
    with BuildSketch(Plane(origin=(0, 5, 0), x_dir=(0, 0, 1), z_dir=(-1, 0, 0))) as fillet3_piece_7:
        with BuildLine():
            CenterArc((7.325, 0.379967104), FILLET3_R, 180, 49.458398126)
            Line((7, 0), (6.9935, -0.007599342))
            ThreePointArc((6.9935, -0.007599342), (6.9125, -0.01), (6.825, -0.01))
            Line((6.825, -0.01), (6.815, 0))
            Line((6.815, 0), (6.815, 0.379967104))
            Line((6.815, 0.379967104), (6.825, 0.379967104))
        make_face()
    revolve(axis=Axis((0, 5, 0), (0, 1, 0)))

    # Chamfer2
    chamfer2_edges = [part.edges().sort_by_distance(p)[0] for p in [
        (0, 43, -7),
    ]]
    chamfer(chamfer2_edges, length=CHAMFER2_SIZE)

    # Sketch13 → Cut-Extrude1 (cut)
    with BuildSketch(Plane(origin=(0, 43, 0), x_dir=(1, 0, 0), z_dir=(0, 1, 0))):
        with Locations(Location((0, 0, 0), (0, 0, 270))):
            Circle(SKETCH13_R)
    extrude(amount=-CUT_EXTRUDE1_DEPTH, mode=Mode.SUBTRACT)

    # Sketch14 → Cut-Extrude2 (cut)
    with BuildSketch(Plane(origin=(0, 28, 0), x_dir=(1, 0, 0), z_dir=(0, 1, 0))):
        with Locations(Location((0, 0, 0), (0, 0, 270))):
            Circle(SKETCH14_R)
    extrude(amount=-CUT_EXTRUDE2_DEPTH, mode=Mode.SUBTRACT)

    # Fillet4
    fillet4_edges = [part.edges().sort_by_distance(p)[0] for p in [
        (0, 28, -5),
    ]]
    fillet(fillet4_edges, radius=FILLET4_R - 0.0001)  # a hair under: the kernel refuses the full size


solid = part.part
